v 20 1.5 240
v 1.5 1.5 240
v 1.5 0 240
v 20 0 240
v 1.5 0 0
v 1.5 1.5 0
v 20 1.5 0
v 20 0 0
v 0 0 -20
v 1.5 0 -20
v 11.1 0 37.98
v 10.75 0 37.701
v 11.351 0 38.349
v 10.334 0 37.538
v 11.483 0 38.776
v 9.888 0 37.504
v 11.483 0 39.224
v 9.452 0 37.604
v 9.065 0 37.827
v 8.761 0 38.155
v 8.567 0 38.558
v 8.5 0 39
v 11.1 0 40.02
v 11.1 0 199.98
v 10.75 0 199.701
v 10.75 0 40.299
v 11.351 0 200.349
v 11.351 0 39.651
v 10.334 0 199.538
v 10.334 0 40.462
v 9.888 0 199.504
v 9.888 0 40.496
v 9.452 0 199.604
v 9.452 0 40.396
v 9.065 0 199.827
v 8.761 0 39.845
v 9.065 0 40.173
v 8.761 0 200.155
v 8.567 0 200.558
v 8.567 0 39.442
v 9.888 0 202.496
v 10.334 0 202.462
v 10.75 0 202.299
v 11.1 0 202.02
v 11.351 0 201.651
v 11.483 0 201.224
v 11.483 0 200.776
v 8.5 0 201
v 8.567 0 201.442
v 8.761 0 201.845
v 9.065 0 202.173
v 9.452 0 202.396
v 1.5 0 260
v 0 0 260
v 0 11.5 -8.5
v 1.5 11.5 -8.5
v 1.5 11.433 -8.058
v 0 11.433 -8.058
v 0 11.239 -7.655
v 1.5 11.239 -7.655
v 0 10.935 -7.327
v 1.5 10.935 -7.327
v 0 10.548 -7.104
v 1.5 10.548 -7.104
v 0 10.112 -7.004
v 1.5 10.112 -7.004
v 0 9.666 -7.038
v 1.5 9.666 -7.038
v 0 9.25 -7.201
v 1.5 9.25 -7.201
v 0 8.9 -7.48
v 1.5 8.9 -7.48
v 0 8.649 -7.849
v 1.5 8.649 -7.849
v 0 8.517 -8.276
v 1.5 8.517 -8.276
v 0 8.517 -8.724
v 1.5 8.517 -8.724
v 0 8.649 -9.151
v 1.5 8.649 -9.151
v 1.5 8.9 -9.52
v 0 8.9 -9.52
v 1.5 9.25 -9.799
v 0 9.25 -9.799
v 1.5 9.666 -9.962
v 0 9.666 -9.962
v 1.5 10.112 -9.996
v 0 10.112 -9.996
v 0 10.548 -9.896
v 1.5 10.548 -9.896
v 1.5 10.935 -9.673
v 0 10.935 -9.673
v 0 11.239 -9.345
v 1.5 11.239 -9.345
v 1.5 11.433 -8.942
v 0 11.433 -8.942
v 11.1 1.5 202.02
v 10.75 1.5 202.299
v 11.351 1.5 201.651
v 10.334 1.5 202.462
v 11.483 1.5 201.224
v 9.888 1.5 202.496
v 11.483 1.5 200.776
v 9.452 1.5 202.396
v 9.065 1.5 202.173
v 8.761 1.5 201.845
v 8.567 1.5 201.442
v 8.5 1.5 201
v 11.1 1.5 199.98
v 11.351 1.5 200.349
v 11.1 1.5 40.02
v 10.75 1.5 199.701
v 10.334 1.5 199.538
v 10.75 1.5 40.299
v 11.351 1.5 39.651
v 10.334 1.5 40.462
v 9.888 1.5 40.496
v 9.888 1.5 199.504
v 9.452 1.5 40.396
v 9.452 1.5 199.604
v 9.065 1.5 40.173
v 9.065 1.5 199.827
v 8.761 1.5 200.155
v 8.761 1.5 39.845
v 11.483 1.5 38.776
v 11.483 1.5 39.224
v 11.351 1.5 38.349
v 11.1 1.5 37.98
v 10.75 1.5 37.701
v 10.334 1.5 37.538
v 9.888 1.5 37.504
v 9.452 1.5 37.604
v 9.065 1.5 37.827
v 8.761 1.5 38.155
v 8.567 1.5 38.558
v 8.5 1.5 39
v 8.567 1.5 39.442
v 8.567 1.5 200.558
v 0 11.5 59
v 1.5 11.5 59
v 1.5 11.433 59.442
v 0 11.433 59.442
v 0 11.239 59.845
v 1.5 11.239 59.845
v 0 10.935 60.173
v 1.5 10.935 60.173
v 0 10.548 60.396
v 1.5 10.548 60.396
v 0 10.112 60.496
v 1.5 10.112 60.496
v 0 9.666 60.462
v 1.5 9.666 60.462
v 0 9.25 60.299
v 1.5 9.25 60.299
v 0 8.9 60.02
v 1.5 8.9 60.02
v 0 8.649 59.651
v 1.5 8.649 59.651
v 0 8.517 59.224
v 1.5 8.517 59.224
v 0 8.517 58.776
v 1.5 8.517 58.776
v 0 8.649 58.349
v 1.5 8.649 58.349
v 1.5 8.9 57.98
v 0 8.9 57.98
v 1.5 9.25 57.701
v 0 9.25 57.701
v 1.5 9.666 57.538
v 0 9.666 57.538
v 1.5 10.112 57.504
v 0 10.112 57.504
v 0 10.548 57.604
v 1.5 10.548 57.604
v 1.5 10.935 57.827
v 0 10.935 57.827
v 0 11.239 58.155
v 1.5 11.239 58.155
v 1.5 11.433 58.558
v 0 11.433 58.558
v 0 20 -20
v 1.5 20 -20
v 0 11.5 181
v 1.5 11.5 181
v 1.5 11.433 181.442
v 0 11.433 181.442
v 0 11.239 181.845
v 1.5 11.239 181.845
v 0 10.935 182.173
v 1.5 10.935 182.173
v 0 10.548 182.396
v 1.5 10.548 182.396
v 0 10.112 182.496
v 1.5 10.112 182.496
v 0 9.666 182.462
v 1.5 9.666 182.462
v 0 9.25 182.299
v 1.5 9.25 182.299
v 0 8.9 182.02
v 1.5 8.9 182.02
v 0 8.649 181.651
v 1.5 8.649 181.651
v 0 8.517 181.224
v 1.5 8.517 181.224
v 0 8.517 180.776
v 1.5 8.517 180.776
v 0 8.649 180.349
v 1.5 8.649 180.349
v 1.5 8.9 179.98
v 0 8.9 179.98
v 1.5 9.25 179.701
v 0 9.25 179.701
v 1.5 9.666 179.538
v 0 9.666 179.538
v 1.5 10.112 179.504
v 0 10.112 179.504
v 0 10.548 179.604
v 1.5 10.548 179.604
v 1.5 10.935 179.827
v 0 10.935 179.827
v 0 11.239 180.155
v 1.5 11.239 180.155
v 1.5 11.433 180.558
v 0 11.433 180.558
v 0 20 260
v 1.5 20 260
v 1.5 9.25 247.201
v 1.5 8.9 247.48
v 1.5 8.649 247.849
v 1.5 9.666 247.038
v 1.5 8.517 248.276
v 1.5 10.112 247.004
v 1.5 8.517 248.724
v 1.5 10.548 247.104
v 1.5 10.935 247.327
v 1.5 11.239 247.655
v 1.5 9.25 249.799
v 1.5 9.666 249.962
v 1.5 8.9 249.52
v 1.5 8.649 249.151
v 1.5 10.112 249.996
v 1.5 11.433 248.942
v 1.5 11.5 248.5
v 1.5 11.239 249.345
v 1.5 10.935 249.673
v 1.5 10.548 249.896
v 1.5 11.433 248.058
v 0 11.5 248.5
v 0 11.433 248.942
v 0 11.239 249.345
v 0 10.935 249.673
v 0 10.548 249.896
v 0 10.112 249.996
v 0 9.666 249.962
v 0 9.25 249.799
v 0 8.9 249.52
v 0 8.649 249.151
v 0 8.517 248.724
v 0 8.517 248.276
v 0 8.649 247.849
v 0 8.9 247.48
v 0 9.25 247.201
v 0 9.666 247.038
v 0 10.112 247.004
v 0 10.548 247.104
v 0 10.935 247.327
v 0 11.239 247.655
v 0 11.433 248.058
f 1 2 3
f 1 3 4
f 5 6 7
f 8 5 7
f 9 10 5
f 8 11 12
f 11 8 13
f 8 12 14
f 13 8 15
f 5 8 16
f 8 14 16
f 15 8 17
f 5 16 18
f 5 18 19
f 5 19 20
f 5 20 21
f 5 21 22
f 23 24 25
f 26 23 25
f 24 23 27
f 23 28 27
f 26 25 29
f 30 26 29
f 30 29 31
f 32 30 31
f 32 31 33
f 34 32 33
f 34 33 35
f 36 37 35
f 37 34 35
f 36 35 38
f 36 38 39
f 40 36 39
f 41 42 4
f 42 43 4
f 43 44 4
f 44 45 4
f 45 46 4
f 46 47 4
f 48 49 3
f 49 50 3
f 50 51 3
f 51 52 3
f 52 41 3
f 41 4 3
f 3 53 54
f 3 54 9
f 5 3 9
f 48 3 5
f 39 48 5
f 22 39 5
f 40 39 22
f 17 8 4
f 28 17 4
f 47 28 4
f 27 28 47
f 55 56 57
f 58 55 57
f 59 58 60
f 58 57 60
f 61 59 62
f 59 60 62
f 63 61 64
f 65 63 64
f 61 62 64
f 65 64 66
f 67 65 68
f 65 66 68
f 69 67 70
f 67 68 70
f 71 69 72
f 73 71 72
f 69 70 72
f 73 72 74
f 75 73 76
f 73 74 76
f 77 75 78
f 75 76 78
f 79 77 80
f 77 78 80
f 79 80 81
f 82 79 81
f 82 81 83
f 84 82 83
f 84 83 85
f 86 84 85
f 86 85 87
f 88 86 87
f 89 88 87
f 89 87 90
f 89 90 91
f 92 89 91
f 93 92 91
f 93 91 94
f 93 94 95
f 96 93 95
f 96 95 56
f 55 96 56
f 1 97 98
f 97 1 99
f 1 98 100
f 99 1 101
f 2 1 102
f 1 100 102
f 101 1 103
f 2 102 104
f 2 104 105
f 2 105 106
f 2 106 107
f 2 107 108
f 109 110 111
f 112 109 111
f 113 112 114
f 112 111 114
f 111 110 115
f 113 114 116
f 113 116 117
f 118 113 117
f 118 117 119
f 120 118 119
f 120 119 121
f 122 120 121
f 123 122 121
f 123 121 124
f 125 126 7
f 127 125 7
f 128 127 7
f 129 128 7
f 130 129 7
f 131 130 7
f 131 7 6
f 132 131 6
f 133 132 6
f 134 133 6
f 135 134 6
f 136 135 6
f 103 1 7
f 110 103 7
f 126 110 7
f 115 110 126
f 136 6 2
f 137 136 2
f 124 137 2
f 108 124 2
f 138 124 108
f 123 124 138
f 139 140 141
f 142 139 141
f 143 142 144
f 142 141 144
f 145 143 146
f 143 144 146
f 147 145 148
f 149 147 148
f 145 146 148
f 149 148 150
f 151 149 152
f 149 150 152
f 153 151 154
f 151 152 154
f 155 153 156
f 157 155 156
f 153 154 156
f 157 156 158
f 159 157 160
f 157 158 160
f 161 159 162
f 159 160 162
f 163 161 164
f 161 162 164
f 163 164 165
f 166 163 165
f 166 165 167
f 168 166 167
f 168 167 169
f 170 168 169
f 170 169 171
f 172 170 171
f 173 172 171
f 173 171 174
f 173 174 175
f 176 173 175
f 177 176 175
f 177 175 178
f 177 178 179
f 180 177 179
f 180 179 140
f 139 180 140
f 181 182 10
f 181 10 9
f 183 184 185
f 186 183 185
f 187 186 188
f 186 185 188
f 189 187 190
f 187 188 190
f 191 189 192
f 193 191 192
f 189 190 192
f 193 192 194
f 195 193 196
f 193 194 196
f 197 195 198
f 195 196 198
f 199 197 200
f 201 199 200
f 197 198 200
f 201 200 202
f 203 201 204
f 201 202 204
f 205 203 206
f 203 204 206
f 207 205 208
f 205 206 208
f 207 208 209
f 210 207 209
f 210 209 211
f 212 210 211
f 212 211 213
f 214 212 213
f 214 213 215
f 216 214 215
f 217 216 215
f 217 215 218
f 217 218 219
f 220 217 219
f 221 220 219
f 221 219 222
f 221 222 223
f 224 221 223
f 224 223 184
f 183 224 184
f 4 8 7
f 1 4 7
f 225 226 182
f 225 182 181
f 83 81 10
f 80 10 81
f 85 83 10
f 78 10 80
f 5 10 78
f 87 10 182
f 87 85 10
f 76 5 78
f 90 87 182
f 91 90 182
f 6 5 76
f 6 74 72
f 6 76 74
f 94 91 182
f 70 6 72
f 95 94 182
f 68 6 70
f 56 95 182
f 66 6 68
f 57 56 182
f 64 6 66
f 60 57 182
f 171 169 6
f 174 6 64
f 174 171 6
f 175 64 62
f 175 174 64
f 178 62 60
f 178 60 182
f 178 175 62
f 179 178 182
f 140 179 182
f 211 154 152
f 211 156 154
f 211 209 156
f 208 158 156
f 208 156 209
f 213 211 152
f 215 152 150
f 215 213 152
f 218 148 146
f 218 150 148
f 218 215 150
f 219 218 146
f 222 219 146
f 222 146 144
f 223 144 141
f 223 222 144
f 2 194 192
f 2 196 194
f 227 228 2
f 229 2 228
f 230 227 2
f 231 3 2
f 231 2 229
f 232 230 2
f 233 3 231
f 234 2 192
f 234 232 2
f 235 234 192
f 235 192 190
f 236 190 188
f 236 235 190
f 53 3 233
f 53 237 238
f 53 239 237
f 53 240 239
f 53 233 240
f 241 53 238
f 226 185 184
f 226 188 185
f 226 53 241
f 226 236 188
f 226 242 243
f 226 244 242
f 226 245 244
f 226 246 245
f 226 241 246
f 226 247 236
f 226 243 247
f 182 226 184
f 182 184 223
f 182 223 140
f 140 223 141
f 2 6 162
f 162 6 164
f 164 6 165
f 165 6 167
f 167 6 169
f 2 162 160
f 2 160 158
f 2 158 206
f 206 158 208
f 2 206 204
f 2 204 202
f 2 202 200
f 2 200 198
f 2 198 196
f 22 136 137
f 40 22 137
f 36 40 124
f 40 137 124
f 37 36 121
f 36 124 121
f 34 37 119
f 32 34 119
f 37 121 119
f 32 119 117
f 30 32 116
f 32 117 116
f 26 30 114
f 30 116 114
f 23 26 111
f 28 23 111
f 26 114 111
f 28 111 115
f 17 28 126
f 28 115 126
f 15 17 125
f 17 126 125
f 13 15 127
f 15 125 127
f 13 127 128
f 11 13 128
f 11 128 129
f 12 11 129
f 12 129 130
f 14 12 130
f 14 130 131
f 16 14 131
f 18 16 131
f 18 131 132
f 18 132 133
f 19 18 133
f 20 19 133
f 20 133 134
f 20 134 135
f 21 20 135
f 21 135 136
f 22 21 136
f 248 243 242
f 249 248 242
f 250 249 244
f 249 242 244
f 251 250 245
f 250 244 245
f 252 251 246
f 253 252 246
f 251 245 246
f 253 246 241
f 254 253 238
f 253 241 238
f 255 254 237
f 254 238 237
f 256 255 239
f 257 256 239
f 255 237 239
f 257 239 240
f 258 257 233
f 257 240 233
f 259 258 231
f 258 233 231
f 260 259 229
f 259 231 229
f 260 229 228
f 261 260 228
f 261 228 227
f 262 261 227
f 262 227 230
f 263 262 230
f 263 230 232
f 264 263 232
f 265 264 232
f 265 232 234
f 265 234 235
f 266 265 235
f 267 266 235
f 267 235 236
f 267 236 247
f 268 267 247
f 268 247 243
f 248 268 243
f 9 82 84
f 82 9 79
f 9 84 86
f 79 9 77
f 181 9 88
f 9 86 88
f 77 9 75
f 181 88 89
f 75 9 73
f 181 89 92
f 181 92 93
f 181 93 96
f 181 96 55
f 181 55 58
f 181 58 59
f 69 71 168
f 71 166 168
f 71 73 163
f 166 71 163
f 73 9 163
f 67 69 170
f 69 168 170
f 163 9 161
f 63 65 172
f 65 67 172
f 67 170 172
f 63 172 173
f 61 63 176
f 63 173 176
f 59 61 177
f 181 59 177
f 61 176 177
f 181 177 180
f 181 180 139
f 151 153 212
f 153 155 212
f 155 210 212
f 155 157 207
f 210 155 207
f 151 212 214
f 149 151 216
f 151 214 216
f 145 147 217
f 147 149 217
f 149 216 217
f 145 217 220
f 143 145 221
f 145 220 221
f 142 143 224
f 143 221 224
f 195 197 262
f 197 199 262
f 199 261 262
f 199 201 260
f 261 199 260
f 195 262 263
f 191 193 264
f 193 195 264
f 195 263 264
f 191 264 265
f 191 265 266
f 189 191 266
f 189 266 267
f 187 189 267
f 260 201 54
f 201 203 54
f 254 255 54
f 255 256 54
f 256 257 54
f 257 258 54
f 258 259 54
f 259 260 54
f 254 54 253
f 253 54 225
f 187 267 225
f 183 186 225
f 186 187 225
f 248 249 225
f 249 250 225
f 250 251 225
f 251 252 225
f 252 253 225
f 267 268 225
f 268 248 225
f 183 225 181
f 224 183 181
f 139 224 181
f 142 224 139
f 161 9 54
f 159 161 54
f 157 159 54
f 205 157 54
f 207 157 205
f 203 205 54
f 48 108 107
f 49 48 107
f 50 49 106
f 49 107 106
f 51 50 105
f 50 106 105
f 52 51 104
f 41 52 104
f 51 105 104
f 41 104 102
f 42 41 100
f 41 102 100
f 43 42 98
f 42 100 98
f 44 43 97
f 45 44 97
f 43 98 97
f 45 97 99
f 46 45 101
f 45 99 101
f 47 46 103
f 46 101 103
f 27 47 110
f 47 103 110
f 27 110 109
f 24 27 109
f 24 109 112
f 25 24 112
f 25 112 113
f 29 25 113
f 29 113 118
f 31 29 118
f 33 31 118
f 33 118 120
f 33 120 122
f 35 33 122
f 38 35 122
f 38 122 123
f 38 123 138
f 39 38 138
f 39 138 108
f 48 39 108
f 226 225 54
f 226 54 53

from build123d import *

# Parameters (mm, degrees)
EXTRUSION1_DEPTH = 240
ESQUISSE2_R      = 1.5
EXTRUSION2_DEPTH = 242.541404318
ESQUISSE3_W      = 1.5
ESQUISSE3_H      = 20
EXTRUSION3_DEPTH = 20
ESQUISSE5_W      = 1.5
ESQUISSE5_H      = 20
EXTRUSION4_DEPTH = 20
ESQUISSE6_R      = 1.5
EXTRUSION5_DEPTH = 262.423506977


with BuildPart() as part:
    # Esquisse1 → Extrusion1 (new body)
    with BuildSketch(Plane.XY):
        Polygon((0, 0), (20, 0), (20, 1.5), (1.5, 1.5), (1.5, 20), (0, 20), align=None)
    extrude(amount=EXTRUSION1_DEPTH)

    # Esquisse2 → Extrusion2 (cut, through all)
    with BuildSketch(Plane(origin=(0, 1.5, 0), x_dir=(1, 0, 0), z_dir=(0, 1, 0))):
        with Locations(Location((10, -39, 0), (0, 0, 180))):
            Circle(ESQUISSE2_R)
        with Locations(Location((10, -201, 0), (0, 0, 180))):
            Circle(ESQUISSE2_R)
    extrude(amount=-EXTRUSION2_DEPTH, mode=Mode.SUBTRACT)

    # Esquisse3 → Extrusion3 (add)
    with BuildSketch(Plane.XY.offset(240)):
        with Locations((0.75, 10)):
            Rectangle(ESQUISSE3_W, ESQUISSE3_H)
    extrude(amount=EXTRUSION3_DEPTH)

    # Esquisse5 → Extrusion4 (add)
    with BuildSketch(Plane(origin=(0, 0, 0), x_dir=(-1, 0, 0), z_dir=(0, 0, -1))):
        with Locations((-0.75, 10)):
            Rectangle(ESQUISSE5_W, ESQUISSE5_H)
    extrude(amount=EXTRUSION4_DEPTH)

    # Esquisse6 → Extrusion5 (cut, through all)
    with BuildSketch(Plane(origin=(1.5, 0, 0), x_dir=(0, 0, -1), z_dir=(1, 0, 0))):
        with Locations(Location((-248.5, 10, 0), (0, 0, 90))):
            Circle(ESQUISSE6_R)
        with Locations(Location((8.5, 10, 0), (0, 0, 90))):
            Circle(ESQUISSE6_R)
        with Locations(Location((-181, 10, 0), (0, 0, 90))):
            Circle(ESQUISSE6_R)
        with Locations(Location((-59, 10, 0), (0, 0, 90))):
            Circle(ESQUISSE6_R)
    extrude(amount=-EXTRUSION5_DEPTH, mode=Mode.SUBTRACT)


solid = part.part
